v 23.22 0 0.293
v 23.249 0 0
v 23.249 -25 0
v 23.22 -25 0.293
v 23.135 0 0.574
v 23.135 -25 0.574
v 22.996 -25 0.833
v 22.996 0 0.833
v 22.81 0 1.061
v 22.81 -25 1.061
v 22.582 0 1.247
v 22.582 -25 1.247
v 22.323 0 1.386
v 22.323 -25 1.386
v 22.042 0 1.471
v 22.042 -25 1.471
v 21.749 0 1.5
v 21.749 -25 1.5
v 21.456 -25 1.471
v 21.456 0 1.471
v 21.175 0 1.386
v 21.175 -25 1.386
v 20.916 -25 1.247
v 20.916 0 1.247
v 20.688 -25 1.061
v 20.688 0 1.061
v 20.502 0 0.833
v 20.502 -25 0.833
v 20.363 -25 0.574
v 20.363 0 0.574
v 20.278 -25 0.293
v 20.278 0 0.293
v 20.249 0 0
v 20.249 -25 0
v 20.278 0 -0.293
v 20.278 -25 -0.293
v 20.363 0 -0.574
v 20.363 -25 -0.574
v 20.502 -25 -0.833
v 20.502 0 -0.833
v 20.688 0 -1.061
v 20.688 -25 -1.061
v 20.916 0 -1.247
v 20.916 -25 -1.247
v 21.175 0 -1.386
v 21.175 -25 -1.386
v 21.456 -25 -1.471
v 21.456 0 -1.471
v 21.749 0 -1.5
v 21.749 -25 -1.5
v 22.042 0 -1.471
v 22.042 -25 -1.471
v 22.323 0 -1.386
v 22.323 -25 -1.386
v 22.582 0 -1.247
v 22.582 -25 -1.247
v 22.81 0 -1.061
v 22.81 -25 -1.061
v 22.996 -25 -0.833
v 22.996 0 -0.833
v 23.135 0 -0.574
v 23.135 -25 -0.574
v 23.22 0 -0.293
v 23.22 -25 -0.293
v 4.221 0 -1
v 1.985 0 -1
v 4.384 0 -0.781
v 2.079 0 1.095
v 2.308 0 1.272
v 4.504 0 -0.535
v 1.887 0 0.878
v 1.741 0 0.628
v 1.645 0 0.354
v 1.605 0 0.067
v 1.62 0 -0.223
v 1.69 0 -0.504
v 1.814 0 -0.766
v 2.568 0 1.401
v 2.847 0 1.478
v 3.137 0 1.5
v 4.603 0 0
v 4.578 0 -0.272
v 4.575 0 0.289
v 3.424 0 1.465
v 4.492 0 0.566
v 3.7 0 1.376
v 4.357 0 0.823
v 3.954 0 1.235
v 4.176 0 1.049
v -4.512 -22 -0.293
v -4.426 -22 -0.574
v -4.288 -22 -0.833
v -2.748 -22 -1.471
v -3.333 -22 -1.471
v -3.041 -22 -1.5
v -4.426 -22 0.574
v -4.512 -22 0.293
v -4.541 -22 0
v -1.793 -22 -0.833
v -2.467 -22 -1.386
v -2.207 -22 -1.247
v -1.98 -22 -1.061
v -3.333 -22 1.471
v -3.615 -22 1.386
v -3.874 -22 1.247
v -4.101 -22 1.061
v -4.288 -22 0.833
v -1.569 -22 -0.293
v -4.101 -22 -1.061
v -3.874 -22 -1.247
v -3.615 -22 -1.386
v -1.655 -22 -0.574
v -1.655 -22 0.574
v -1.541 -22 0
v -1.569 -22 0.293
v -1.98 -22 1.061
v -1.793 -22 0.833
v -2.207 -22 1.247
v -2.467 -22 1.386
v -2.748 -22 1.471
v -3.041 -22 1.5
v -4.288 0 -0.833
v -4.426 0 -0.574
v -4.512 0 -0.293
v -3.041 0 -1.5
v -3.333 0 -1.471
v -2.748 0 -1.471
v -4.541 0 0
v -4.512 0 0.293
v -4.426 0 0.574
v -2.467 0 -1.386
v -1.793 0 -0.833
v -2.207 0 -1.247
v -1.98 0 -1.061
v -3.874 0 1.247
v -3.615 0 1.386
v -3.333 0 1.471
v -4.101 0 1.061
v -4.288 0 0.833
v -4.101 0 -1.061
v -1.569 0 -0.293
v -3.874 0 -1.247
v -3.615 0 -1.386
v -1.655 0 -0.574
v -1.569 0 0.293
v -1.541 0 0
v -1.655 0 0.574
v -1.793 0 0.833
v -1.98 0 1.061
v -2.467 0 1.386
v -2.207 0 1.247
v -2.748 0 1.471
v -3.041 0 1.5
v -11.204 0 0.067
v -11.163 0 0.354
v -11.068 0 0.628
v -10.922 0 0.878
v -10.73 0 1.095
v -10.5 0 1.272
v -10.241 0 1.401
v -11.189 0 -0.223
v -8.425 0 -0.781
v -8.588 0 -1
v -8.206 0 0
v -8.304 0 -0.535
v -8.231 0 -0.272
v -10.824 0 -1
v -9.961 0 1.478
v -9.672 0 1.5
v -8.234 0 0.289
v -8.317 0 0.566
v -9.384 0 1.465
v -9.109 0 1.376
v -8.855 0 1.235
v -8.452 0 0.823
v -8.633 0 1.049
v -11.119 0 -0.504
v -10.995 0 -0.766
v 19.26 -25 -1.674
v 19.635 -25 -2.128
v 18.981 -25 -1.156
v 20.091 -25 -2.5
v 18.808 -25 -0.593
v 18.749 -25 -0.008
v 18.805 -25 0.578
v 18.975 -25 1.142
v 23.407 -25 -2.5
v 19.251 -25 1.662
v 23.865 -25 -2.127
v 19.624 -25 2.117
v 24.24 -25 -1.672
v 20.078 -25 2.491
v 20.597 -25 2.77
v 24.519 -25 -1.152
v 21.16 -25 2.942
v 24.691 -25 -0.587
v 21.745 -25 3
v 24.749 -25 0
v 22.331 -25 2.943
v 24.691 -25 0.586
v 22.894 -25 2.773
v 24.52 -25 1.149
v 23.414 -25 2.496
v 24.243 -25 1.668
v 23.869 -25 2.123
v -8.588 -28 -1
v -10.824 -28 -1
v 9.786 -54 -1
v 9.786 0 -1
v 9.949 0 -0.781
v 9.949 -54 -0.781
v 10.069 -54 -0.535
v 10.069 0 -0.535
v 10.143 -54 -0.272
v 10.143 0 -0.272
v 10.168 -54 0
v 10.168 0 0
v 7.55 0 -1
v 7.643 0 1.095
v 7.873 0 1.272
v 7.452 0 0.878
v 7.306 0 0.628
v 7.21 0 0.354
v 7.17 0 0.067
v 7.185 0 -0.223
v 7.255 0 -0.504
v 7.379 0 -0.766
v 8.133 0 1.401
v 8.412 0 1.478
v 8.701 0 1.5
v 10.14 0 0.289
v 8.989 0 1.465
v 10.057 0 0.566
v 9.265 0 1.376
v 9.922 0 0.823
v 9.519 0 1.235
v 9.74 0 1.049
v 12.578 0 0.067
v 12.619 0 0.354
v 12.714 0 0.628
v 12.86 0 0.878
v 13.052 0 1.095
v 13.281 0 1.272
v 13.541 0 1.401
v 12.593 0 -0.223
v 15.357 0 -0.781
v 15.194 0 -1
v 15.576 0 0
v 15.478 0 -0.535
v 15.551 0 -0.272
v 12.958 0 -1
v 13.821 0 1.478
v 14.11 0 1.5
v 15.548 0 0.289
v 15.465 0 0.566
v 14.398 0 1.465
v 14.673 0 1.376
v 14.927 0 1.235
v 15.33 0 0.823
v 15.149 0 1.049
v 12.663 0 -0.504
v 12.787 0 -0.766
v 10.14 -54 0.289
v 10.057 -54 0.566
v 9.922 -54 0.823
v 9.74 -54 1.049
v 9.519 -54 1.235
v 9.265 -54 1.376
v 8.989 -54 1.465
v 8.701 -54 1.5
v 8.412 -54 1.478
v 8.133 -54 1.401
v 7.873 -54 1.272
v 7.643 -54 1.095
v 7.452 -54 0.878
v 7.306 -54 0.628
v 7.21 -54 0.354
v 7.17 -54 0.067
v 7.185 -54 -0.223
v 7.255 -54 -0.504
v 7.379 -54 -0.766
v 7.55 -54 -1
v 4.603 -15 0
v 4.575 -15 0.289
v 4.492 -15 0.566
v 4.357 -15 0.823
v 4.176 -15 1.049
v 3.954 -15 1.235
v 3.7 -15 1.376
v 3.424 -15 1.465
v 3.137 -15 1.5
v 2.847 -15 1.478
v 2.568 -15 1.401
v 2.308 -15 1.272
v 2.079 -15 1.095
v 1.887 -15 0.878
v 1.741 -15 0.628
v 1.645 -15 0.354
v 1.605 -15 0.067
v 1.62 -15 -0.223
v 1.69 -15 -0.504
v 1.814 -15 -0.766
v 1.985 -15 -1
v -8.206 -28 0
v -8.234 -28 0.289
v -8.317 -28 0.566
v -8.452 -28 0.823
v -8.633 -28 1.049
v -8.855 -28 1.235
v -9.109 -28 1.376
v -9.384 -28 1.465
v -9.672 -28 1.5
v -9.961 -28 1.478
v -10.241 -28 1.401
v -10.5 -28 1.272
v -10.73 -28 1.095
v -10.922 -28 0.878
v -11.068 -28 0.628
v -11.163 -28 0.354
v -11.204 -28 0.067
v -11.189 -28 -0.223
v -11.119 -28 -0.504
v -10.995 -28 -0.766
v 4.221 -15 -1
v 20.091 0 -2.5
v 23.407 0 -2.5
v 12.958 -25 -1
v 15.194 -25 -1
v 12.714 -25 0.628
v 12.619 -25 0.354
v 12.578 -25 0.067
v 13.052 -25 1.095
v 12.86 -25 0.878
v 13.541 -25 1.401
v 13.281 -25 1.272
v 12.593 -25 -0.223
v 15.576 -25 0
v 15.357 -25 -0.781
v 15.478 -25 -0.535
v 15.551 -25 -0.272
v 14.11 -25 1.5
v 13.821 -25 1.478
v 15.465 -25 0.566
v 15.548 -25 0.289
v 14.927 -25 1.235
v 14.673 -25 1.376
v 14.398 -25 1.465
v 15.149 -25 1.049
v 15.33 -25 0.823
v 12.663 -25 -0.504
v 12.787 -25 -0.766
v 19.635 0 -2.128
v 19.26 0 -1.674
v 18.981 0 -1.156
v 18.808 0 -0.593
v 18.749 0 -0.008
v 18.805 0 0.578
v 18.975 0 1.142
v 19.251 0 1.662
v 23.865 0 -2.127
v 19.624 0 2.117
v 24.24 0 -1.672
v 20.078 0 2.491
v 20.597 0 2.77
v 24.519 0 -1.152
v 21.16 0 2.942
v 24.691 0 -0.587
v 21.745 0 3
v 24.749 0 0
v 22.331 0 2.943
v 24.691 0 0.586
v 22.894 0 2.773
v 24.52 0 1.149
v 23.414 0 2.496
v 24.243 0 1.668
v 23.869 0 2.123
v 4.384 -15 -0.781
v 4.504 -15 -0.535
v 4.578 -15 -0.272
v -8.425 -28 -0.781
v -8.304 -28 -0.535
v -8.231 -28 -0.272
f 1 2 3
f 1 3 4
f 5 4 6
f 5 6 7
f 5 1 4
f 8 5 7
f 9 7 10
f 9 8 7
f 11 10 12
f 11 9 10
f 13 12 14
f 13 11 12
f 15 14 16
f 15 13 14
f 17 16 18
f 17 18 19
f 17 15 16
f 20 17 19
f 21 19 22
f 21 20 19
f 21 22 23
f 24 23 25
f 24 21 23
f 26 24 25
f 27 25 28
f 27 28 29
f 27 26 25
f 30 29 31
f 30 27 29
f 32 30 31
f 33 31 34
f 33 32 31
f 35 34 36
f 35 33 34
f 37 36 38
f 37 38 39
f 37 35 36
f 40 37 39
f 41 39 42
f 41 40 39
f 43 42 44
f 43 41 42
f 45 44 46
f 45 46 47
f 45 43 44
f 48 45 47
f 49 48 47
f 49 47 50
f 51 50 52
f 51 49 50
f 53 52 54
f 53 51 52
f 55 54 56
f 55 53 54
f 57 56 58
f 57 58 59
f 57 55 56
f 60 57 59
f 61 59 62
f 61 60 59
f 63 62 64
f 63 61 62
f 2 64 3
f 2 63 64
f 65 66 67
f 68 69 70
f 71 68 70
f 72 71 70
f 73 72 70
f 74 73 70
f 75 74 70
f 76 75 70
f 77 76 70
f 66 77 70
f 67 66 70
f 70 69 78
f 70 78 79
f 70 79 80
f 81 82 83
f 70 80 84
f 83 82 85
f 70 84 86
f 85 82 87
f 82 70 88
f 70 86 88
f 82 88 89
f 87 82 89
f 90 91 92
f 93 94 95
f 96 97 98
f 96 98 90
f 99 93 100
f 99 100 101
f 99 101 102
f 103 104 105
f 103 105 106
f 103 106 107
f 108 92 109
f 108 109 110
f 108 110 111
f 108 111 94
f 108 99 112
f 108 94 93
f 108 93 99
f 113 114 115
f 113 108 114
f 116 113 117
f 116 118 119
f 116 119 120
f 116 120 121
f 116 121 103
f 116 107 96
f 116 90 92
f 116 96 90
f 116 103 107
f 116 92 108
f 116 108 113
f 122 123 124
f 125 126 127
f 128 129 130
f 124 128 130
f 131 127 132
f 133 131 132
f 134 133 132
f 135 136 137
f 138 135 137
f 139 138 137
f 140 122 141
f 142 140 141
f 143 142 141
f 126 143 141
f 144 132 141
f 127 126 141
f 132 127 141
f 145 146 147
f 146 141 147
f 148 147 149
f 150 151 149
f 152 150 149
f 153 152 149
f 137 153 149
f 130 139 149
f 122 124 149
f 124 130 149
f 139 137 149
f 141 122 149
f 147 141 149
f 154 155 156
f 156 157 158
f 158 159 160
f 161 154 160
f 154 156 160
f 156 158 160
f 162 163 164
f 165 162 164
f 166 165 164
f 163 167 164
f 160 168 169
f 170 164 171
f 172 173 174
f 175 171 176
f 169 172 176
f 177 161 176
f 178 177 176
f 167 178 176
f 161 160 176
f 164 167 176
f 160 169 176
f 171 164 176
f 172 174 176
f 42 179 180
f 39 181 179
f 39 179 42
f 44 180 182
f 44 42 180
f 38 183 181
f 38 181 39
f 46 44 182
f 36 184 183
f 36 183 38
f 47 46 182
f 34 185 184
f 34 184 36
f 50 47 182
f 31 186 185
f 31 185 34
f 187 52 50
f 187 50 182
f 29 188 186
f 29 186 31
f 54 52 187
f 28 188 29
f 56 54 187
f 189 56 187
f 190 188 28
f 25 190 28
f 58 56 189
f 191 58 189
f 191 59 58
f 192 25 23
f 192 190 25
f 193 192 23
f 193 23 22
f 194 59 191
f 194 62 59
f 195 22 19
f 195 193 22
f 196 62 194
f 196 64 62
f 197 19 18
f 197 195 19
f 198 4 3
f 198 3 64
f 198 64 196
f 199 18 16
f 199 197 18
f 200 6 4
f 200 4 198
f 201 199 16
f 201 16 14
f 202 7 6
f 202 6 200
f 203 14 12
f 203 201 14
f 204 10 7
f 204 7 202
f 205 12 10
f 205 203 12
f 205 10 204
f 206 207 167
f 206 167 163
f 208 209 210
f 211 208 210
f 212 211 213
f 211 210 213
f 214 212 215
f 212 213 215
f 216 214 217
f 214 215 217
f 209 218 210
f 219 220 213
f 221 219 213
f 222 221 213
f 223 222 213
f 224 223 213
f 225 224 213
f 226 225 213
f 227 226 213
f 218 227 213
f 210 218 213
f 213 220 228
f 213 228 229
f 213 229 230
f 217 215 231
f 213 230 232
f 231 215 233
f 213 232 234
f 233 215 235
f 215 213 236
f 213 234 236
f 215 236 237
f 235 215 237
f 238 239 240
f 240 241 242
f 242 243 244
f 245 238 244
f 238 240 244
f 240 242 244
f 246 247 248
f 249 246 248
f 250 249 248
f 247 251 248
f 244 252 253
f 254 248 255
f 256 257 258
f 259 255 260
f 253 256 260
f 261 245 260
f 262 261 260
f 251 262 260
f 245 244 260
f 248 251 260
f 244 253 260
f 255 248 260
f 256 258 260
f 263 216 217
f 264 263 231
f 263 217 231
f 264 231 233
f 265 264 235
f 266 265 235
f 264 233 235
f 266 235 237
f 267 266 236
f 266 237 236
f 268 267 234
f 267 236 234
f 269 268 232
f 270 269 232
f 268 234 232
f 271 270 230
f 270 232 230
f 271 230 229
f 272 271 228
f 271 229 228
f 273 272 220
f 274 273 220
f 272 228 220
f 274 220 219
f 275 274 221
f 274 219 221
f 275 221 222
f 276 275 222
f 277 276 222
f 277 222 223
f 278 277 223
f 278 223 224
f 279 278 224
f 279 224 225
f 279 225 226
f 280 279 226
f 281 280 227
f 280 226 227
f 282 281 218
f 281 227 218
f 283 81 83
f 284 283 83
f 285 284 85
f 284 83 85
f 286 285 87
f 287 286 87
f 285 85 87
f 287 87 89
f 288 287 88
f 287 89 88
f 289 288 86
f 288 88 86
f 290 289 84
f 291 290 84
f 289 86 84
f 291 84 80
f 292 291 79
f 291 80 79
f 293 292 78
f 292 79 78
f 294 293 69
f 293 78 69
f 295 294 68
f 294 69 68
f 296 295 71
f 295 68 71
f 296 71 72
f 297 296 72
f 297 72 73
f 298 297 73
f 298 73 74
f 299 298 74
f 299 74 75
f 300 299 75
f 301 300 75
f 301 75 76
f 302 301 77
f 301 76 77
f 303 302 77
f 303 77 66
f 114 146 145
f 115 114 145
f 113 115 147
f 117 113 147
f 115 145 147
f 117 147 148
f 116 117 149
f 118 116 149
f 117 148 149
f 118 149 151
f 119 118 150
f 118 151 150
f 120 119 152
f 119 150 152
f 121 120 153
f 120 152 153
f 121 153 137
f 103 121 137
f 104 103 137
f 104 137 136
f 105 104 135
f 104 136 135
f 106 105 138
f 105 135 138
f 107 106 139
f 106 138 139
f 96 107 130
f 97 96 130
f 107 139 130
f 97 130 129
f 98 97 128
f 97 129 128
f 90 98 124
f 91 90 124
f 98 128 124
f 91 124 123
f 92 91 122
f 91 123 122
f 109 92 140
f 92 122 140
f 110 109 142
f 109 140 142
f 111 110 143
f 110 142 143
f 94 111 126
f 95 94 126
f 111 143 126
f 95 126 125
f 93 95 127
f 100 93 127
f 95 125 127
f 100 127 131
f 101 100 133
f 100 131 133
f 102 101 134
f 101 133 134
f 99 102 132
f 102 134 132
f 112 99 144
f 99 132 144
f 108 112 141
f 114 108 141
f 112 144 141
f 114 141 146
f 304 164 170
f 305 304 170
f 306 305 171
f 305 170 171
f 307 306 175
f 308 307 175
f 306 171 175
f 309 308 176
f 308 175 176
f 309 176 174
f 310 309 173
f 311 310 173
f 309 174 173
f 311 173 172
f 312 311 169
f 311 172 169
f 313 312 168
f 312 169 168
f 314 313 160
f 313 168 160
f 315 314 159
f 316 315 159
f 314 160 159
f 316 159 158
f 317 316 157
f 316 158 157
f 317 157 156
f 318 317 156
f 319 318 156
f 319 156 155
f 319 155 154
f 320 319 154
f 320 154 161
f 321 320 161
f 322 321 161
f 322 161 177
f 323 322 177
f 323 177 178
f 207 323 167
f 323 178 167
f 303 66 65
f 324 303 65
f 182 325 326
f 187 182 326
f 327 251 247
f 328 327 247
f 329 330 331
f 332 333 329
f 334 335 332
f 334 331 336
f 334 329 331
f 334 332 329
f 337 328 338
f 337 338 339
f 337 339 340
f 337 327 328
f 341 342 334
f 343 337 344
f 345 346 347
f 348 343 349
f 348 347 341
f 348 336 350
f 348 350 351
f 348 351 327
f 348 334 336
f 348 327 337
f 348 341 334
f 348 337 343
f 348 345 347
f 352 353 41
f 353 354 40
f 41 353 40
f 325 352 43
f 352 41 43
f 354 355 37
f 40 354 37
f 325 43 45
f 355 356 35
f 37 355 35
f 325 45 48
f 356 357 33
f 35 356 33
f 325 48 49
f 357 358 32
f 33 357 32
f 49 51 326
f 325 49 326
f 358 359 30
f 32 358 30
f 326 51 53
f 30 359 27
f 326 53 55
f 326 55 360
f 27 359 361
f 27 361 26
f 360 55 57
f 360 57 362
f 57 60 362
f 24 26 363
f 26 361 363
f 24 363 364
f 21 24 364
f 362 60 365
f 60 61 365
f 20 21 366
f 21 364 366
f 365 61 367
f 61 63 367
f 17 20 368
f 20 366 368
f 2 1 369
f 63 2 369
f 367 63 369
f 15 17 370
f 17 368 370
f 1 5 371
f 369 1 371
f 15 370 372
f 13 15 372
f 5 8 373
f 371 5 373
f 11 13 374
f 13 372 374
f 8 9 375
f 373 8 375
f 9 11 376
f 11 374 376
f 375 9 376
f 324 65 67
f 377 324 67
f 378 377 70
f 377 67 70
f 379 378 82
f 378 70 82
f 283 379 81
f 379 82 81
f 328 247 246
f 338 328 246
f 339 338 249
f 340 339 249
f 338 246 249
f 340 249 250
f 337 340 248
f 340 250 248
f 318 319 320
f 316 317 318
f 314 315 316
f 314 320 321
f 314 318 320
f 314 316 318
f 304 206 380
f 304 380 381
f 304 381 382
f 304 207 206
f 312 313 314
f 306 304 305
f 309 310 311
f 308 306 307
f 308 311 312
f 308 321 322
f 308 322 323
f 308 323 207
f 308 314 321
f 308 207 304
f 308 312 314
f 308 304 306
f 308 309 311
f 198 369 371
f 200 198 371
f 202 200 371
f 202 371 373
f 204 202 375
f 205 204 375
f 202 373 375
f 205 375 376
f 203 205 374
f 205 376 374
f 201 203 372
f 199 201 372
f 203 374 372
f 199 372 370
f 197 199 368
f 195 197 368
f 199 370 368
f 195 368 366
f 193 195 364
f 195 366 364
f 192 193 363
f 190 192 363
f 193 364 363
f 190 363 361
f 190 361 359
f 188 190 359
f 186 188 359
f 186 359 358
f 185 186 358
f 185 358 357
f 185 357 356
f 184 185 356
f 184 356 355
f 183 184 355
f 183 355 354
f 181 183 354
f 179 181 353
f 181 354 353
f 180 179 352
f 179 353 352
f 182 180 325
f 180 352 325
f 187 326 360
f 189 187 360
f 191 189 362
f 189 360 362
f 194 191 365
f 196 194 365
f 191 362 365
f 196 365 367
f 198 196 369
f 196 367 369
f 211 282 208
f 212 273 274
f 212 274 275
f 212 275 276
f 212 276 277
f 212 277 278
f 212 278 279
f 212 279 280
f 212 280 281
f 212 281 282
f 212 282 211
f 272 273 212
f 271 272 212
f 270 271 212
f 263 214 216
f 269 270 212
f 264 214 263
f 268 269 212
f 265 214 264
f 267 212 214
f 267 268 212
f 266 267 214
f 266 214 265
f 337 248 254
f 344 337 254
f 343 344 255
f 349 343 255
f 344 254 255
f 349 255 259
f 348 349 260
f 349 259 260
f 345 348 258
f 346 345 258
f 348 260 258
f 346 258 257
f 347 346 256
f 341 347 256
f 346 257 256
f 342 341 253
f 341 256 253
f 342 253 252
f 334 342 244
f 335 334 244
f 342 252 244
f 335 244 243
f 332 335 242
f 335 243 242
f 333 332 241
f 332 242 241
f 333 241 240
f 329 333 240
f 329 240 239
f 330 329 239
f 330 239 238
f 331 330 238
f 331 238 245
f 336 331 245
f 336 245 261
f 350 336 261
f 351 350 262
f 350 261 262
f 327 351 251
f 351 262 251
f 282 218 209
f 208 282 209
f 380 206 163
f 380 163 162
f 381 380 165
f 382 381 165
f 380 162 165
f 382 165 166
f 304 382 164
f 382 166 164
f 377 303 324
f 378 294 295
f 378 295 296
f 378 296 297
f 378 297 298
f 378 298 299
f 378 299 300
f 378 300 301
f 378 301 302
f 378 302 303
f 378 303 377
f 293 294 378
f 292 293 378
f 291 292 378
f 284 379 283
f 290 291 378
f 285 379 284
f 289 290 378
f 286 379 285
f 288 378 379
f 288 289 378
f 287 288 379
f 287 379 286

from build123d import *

# Parameters (mm, degrees)
F1_DEPTH = 28
F0_R     = 1.5
F2_DEPTH = 22
F3_DEPTH = 15
F4_DEPTH = 54
F5_DEPTH = 25
F6_DEPTH = 25


with BuildPart() as f1:
    # F0 (on Front) → F1 (new body)
    with BuildSketch(Plane.XZ):
        with BuildLine():
            ThreePointArc((-8.587657, -1), (-8.304432, -0.535233), (-8.205691, 0))
            ThreePointArc((-8.205691, 0), (-10.240924, 1.401259), (-10.823725, -1))
            Line((-10.823725, -1), (-8.587657, -1))
        make_face()
    extrude(amount=F1_DEPTH)


with BuildPart() as f2:
    # F0 (on Front) → F2 (new body)
    with BuildSketch(Plane.XZ):
        with Locations((-3.040622, 0)):
            Circle(F0_R)
    extrude(amount=F2_DEPTH)


with BuildPart() as f3:
    # F0 (on Front) → F3 (new body)
    with BuildSketch(Plane.XZ):
        with BuildLine():
            ThreePointArc((4.603174, 0), (2.567941, 1.401259), (1.98514, -1))
            Line((1.98514, -1), (4.221208, -1))
            ThreePointArc((4.221208, -1), (4.504432, -0.535233), (4.603174, 0))
        make_face()
    extrude(amount=F3_DEPTH)


with BuildPart() as f4:
    # F0 (on Front) → F4 (new body)
    with BuildSketch(Plane.XZ):
        with BuildLine():
            ThreePointArc((10.168094, 0), (8.132861, 1.401259), (7.55006, -1))
            Line((7.55006, -1), (9.786128, -1))
            ThreePointArc((9.786128, -1), (10.069352, -0.535233), (10.168094, 0))
        make_face()
    extrude(amount=F4_DEPTH)


with BuildPart() as f5:
    # F0 (on Front) → F5 (new body)
    with BuildSketch(Plane.XZ):
        with BuildLine():
            ThreePointArc((15.194305, -1), (15.47753, -0.535233), (15.576271, 0))
            ThreePointArc((15.576271, 0), (13.541038, 1.401259), (12.958237, -1))
            Line((12.958237, -1), (15.194305, -1))
        make_face()
    extrude(amount=F5_DEPTH)


with BuildPart() as f6:
    # F0 (on Front) → F6 (new body)
    with BuildSketch(Plane.XZ):
        with BuildLine():
            ThreePointArc((23.40736, -2.5), (24.39243, -1.418637), (24.749048, 0))
            ThreePointArc((24.749048, 0), (20.33041, 2.643382), (20.090735, -2.5))
            Line((20.090735, -2.5), (23.40736, -2.5))
        make_face()
        with Locations((21.749048, 0)):
            Circle(F0_R, mode=Mode.SUBTRACT)
    extrude(amount=F6_DEPTH)


solid = Compound([f1.part, f2.part, f3.part, f4.part, f5.part, f6.part])
